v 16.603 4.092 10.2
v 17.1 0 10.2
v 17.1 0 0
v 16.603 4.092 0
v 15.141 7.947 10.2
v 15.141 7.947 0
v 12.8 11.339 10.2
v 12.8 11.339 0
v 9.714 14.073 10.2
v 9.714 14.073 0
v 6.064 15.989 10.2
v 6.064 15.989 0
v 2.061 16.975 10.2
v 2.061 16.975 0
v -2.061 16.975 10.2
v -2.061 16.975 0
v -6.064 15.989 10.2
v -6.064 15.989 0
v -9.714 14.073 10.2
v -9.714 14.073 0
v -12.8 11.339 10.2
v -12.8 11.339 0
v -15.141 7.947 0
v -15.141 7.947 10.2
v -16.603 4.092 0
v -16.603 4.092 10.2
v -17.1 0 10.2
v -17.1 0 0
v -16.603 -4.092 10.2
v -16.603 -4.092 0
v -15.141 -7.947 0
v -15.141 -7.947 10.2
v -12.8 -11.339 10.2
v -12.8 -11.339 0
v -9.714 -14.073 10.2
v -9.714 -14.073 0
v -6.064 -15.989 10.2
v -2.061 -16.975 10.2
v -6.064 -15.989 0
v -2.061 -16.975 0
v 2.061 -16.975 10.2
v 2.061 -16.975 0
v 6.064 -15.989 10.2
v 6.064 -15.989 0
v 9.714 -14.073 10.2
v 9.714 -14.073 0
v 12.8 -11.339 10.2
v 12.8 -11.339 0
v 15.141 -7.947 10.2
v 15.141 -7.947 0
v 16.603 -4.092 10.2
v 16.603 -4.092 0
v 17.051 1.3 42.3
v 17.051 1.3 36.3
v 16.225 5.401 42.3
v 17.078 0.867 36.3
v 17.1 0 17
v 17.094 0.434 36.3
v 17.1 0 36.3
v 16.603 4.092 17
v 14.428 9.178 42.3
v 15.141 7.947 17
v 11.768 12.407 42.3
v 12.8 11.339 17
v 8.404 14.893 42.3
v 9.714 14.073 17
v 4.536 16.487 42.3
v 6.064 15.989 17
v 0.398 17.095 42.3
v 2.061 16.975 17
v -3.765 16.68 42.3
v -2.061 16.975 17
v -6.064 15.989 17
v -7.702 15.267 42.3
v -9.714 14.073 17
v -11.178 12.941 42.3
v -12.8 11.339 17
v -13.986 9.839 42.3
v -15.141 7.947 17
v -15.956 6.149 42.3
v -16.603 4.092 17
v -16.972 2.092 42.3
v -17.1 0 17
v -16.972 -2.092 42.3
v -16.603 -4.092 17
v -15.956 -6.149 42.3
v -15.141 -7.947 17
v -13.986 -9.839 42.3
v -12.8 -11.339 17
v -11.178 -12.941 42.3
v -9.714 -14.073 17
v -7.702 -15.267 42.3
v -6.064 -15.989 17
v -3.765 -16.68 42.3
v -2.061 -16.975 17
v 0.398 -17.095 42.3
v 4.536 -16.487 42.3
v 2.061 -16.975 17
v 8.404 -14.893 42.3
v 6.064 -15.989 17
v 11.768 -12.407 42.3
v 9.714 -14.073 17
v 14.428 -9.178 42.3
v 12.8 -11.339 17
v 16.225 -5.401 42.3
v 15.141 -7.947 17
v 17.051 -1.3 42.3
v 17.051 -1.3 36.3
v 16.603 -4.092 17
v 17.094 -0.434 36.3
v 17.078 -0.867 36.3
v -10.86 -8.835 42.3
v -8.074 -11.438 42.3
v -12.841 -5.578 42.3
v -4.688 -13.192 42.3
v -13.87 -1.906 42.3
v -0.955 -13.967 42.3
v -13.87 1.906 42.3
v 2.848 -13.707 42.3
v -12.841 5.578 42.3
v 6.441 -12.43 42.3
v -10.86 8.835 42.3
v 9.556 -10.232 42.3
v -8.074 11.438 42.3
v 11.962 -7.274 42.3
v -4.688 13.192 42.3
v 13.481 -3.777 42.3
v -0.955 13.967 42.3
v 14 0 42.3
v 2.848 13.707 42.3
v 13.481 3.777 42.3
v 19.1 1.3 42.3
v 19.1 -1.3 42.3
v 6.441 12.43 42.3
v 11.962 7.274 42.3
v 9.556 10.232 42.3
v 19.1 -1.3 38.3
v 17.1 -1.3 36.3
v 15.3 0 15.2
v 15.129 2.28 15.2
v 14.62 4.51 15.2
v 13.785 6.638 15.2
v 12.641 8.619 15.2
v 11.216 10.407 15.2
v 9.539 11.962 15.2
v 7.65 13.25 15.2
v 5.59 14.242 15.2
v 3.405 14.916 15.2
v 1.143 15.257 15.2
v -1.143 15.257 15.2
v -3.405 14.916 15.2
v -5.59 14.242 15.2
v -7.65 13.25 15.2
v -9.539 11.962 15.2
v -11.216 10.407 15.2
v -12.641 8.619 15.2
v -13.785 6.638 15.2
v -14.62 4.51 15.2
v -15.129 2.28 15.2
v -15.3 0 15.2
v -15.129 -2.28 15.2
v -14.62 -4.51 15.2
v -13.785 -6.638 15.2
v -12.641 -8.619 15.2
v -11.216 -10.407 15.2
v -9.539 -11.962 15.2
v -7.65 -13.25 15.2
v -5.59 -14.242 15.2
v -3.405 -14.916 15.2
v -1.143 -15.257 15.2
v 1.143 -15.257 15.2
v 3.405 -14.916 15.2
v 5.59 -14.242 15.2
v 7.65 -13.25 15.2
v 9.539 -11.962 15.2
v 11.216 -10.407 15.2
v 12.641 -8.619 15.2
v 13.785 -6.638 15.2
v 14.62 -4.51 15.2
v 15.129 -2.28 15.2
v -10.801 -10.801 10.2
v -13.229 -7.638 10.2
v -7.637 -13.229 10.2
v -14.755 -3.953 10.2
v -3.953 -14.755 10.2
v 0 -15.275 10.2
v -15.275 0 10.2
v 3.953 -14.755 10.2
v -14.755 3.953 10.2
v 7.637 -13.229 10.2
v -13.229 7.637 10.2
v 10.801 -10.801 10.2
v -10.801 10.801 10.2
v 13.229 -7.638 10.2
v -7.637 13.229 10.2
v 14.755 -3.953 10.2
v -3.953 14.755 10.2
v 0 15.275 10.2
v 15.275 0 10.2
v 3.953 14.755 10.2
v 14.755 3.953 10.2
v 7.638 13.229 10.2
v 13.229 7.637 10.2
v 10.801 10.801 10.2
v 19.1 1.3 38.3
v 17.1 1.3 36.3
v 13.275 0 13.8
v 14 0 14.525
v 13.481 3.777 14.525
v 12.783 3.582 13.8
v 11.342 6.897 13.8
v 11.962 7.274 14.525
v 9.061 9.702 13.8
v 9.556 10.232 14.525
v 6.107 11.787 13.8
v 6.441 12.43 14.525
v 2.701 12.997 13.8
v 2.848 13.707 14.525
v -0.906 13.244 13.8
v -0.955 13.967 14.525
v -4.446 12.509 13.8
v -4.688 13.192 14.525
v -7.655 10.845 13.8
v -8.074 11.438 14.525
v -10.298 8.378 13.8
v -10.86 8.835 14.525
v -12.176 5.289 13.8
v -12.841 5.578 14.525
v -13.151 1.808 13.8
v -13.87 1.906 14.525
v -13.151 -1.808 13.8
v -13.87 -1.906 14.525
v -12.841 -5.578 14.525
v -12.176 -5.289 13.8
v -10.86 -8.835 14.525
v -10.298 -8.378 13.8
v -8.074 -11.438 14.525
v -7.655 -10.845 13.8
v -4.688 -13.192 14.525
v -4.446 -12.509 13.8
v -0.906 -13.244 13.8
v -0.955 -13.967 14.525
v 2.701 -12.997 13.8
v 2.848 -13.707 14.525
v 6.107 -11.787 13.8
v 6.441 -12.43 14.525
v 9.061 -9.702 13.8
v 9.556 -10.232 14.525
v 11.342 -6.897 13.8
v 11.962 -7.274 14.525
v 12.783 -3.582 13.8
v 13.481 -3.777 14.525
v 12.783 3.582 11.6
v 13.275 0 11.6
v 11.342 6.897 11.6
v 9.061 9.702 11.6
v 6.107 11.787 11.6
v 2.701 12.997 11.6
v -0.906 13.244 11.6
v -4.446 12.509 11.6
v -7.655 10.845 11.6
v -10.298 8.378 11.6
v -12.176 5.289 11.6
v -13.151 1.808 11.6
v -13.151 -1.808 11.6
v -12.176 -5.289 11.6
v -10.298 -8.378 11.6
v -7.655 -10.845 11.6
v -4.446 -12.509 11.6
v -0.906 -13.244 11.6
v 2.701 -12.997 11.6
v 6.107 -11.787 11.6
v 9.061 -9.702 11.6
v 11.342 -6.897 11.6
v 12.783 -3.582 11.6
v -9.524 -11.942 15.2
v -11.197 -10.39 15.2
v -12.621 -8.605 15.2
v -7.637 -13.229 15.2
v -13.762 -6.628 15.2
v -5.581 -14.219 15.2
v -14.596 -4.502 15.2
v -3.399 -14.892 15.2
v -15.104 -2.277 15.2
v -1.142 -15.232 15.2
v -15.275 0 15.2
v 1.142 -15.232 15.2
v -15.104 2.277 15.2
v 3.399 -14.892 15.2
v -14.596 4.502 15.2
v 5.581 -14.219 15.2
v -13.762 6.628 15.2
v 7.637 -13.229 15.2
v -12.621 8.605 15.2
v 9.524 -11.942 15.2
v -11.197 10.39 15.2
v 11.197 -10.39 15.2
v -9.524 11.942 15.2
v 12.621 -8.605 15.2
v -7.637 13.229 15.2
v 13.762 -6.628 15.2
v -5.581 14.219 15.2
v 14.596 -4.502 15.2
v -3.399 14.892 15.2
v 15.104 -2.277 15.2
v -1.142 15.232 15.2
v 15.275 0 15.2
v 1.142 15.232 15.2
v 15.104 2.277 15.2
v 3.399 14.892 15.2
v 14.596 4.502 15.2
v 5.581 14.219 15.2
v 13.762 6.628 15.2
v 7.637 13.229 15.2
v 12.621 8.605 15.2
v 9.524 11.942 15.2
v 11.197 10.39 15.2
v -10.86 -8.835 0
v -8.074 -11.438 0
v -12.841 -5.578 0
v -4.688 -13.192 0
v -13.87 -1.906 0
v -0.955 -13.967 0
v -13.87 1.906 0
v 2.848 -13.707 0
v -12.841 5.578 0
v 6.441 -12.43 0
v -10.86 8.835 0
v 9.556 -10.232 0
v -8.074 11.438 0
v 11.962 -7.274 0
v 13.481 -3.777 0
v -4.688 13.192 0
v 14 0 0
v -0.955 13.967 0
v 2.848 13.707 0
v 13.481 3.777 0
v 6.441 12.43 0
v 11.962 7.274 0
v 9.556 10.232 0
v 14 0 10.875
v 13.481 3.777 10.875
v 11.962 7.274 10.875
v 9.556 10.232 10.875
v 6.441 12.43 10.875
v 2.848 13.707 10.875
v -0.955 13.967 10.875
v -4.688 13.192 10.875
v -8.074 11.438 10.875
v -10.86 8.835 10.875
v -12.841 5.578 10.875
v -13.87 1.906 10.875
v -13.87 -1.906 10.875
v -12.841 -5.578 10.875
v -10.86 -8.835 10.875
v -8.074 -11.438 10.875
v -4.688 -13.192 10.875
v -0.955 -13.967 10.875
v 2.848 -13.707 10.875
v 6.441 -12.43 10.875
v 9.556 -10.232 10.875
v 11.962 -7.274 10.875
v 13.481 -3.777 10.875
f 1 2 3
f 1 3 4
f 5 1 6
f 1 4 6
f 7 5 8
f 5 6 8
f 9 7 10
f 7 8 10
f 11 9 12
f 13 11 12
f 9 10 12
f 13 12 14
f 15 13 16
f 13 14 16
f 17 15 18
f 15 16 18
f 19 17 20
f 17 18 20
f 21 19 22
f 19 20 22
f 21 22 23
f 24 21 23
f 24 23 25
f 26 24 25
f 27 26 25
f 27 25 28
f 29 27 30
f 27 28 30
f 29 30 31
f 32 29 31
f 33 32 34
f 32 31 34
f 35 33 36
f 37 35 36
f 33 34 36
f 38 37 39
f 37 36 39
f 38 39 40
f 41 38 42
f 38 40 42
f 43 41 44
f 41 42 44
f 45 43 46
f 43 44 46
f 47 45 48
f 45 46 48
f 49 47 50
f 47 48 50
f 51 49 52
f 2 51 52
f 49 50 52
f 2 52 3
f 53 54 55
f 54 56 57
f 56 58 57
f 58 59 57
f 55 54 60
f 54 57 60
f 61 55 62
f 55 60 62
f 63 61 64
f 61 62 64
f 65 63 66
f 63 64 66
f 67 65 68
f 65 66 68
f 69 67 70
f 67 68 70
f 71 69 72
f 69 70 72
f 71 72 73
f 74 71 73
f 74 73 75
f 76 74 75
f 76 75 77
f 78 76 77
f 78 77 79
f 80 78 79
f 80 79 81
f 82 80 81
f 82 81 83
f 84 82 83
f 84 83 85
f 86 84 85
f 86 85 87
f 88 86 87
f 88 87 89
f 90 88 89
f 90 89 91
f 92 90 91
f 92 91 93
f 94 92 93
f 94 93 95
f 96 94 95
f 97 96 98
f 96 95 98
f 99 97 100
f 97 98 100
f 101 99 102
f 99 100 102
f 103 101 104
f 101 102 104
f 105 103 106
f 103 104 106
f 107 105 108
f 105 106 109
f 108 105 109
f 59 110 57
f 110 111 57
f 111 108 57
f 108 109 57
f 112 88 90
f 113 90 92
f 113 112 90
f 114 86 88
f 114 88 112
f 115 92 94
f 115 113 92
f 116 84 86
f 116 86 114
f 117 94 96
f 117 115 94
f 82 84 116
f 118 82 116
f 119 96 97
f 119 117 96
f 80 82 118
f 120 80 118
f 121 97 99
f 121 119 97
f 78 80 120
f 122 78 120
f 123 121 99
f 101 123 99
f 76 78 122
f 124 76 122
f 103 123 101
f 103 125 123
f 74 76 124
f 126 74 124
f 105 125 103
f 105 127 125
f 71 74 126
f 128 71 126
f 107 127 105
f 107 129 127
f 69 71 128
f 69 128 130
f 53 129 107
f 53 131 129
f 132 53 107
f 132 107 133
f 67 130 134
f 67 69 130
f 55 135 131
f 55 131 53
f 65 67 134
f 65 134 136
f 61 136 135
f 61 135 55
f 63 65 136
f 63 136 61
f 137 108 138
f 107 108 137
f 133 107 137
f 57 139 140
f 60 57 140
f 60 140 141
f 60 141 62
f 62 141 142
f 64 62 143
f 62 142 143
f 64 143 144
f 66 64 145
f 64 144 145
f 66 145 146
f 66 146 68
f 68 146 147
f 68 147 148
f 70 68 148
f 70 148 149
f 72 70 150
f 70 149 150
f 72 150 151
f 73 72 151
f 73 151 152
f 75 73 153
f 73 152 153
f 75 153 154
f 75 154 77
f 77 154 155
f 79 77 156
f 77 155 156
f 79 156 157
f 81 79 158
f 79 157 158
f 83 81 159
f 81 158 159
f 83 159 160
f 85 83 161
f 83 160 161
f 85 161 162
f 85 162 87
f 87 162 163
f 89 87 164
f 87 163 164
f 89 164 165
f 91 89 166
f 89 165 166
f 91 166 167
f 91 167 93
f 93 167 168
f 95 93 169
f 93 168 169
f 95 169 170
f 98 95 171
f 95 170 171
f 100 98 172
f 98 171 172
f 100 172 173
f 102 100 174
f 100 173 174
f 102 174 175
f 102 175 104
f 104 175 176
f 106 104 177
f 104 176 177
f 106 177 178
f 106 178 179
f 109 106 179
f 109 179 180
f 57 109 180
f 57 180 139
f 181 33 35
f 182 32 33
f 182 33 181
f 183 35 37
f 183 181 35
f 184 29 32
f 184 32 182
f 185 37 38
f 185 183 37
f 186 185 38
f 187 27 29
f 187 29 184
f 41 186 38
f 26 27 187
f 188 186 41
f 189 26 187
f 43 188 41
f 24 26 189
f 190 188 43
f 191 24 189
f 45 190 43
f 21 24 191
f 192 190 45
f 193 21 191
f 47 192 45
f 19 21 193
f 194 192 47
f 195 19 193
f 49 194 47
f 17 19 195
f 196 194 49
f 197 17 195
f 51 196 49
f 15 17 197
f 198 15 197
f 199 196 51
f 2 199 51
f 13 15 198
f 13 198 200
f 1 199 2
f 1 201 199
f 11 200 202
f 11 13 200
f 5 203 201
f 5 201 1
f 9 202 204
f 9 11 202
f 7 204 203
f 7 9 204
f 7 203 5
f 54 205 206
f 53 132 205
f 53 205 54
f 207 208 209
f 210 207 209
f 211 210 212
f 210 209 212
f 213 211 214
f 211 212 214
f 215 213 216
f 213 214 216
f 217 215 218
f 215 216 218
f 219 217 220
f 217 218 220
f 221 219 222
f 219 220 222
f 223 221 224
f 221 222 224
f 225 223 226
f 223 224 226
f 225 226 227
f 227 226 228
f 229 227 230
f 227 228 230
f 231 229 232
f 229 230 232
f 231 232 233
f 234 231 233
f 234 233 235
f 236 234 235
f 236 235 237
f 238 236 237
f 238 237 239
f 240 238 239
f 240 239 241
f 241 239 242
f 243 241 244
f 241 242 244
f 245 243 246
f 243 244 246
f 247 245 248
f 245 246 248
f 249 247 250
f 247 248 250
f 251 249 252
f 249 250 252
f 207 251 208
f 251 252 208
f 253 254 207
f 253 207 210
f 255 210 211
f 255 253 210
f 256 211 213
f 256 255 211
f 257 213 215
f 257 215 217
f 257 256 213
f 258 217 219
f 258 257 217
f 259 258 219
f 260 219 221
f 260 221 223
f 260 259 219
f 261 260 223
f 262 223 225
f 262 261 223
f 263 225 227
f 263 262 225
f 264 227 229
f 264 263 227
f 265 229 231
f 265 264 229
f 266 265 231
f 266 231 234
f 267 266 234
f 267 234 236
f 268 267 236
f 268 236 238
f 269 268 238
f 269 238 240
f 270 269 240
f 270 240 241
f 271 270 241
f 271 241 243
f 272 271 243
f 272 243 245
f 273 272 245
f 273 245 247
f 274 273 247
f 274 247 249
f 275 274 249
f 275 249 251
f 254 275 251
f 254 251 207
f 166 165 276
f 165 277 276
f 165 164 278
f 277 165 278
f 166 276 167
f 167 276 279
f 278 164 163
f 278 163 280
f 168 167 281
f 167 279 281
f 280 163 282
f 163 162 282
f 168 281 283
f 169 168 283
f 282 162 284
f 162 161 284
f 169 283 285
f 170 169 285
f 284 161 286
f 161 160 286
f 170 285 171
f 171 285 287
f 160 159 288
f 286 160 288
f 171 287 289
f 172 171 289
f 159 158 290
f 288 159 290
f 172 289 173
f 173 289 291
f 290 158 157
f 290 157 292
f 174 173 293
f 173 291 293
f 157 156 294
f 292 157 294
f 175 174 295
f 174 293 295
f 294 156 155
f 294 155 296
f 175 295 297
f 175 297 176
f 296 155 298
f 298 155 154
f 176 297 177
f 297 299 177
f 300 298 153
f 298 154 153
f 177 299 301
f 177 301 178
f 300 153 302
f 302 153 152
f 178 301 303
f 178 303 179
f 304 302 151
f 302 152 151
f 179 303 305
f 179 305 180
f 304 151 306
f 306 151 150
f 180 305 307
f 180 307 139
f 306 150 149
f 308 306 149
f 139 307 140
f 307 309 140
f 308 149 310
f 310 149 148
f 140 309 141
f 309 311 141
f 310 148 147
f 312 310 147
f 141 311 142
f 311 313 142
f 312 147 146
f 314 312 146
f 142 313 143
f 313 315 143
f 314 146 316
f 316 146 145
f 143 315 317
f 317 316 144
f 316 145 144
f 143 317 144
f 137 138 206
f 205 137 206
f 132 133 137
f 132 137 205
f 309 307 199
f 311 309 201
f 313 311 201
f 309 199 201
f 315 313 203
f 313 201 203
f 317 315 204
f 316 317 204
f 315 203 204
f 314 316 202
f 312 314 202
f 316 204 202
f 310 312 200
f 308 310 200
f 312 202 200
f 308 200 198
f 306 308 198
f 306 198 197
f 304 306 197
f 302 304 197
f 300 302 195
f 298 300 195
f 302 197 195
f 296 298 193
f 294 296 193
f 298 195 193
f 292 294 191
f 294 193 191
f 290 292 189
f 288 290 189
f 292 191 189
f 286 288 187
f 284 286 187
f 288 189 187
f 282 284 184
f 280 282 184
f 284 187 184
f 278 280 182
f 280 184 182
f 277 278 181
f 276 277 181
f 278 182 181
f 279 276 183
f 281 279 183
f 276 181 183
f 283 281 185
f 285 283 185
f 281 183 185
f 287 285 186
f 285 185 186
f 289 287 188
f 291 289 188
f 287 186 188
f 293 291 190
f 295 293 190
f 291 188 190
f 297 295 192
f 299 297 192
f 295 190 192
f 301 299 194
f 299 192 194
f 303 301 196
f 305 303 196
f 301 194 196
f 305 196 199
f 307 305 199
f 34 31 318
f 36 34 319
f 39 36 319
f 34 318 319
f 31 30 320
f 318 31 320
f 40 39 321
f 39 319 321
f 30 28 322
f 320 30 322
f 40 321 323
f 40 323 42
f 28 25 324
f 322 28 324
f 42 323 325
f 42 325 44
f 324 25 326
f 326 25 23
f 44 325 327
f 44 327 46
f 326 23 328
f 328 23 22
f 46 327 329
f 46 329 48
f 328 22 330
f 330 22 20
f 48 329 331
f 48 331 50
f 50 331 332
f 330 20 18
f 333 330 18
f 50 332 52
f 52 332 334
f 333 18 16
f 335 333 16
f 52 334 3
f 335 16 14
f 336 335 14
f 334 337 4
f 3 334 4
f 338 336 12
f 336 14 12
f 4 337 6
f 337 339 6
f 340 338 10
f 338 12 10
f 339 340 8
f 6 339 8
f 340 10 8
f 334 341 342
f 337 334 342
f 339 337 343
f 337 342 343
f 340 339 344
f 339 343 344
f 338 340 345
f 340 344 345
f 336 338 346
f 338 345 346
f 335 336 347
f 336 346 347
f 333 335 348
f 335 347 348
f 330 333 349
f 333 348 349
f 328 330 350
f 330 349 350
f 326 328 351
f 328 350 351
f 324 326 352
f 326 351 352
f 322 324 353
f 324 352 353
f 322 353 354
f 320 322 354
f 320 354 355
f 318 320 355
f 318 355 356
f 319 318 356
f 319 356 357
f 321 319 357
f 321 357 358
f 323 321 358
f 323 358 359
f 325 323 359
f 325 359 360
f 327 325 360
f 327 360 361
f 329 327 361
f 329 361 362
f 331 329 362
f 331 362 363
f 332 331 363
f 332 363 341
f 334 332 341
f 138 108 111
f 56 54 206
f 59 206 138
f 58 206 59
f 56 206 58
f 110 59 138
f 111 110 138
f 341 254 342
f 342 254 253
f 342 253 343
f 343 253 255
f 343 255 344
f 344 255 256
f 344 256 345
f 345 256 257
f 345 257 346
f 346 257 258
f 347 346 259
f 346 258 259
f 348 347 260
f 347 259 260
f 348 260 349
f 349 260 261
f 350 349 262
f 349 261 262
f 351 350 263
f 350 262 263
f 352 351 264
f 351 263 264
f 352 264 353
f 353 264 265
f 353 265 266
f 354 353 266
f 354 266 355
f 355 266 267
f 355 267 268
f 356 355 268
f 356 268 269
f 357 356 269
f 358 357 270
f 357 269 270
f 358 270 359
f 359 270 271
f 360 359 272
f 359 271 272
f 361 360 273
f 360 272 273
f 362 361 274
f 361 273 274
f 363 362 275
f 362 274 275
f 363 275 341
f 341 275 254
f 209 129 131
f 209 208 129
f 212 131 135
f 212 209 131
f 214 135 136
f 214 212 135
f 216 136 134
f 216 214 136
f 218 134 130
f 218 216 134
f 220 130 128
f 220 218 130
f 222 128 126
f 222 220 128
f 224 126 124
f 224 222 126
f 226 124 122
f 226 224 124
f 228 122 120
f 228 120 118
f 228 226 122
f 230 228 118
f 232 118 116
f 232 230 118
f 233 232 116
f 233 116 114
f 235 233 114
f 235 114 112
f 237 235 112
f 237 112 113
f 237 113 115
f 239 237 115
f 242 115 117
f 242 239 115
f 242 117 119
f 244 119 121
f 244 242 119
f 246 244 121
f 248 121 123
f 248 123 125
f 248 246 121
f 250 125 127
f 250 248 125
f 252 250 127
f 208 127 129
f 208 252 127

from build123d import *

# Parameters (mm, degrees)
F0_R         = 17.1
F0_R_2       = 14
F1_DEPTH     = 10.2
F2_R         = 15.275
F2_R_2       = 14
F2_R_3       = 13.275
F3_DEPTH     = 5
F4_R         = 17.1
F4_R_2       = 15.275
F4_R_3       = 14
F5_DEPTH     = 27.1
F6_S5_R      = 14
F6_T6_DEPTH  = 22
F6_S11_R     = 14
F6_T12_DEPTH = 22
F7_SIZE      = 1.8
F9_DEPTH     = 6
F10_SIZE     = 1.99999


# Not quite as in the source:
# - a fillet or chamfer that OpenCascade refuses, or shapes differently, is made with other operations: its cross-section is extruded or revolved along the edge and cut away or added
# - a fillet or chamfer is up to 0.001 mm smaller than in the source, because OpenCascade refuses the exact size


with BuildPart() as f1:
    # F0 (on Top) → F1 (new body)
    with BuildSketch(Plane.XY):
        Circle(F0_R)
        Circle(F0_R_2, mode=Mode.SUBTRACT)
    extrude(amount=F1_DEPTH)

    # F2 (on face) → F3 (join)
    with BuildSketch(Plane.XY.offset(10.2)):
        Circle(F2_R)
        Circle(F2_R_2, mode=Mode.SUBTRACT)
        Circle(F2_R_2)
        Circle(F2_R_3, mode=Mode.SUBTRACT)
    extrude(amount=F3_DEPTH)

    # F4 (on face) → F5 (join)
    with BuildSketch(Plane.XY.offset(15.2)):
        Circle(F4_R)
        Circle(F4_R_2, mode=Mode.SUBTRACT)
        Circle(F4_R_2)
        Circle(F4_R_3, mode=Mode.SUBTRACT)
    extrude(amount=F5_DEPTH)

    # F6: chamfer of 1.4 on 2 edges, made by hand


with BuildPart() as f6_tool2:
    # F6_s3 → F6_t4 (revolve)
    with BuildSketch(Plane.XZ):
        Polygon((14.675, 10.2), (13.275, 11.6), (13.275, 10.2), align=None)
    revolve(axis=Axis((0, 0, 10.2), (0, 0, 1)))

    # F6_s5 → F6_t6 (intersect, symmetric)
    with BuildSketch(Plane.XY.offset(10.9)):
        Circle(F6_S5_R)
    extrude(amount=F6_T6_DEPTH, both=True, mode=Mode.INTERSECT)


with BuildPart() as f1_1:
    add(f1.part)

    # F6_t1: cut F6_tool2
    add(f6_tool2.part, mode=Mode.SUBTRACT)


with BuildPart() as f6_tool8:
    # F6_s9 → F6_t10 (revolve)
    with BuildSketch(Plane.XZ):
        Polygon((13.275, 13.8), (14.675, 15.2), (13.275, 15.2), align=None)
    revolve(axis=Axis((0, 0, 15.2), (0, 0, 1)))

    # F6_s11 → F6_t12 (intersect, symmetric)
    with BuildSketch(Plane.XY.offset(14.5)):
        Circle(F6_S11_R)
    extrude(amount=F6_T12_DEPTH, both=True, mode=Mode.INTERSECT)


with BuildPart() as f1_2:
    add(f1_1.part)

    # F6_t7: cut F6_tool8
    add(f6_tool8.part, mode=Mode.SUBTRACT)

    # F7
    f7_edges = [f1_2.edges().sort_by_distance(p)[0] for p in [
        (-17.1, 0, 15.2),
    ]]
    chamfer(f7_edges, length=F7_SIZE)

    # F8 (on face) → F9 (join)
    with BuildSketch(Plane.XY.offset(42.3)):
        with BuildLine():
            ThreePointArc((17.0505131888, 1.3), (17.0876238185, 0.6504707804), (17.1, 0))
            Line((17.1, 0), (19.1, 0))
            Line((19.1, 0), (19.1, 1.3))
            Line((19.1, 1.3), (17.0505131888, 1.3))
        make_face()
        with BuildLine():
            Line((19.1, 0), (17.1, 0))
            ThreePointArc((17.1, 0), (17.0876238185, -0.6504707804), (17.0505131888, -1.3))
            Line((17.0505131888, -1.3), (19.1, -1.3))
            Line((19.1, -1.3), (19.1, 0))
        make_face()
        with BuildLine():
            Line((17.1, 0), (17.0505131888, 0))
            Line((17.0505131888, 0), (17.0505131888, -1.3))
            ThreePointArc((17.0505131888, -1.3), (17.0876238185, -0.6504707804), (17.1, 0))
        make_face()
        with BuildLine():
            Line((17.0505131888, 1.3), (17.0505131888, 0))
            Line((17.0505131888, 0), (17.1, 0))
            ThreePointArc((17.1, 0), (17.0876238185, 0.6504707804), (17.0505131888, 1.3))
        make_face()
    extrude(amount=-F9_DEPTH)

    # F10 (size 2 in the source; OpenCascade refuses exactly that, so slightly less here)
    f10_edges = [f1_2.edges().sort_by_distance(p)[0] for p in [
        (19.1, 0, 36.3),
    ]]
    chamfer(f10_edges, length=F10_SIZE)


solid = f1_2.part
